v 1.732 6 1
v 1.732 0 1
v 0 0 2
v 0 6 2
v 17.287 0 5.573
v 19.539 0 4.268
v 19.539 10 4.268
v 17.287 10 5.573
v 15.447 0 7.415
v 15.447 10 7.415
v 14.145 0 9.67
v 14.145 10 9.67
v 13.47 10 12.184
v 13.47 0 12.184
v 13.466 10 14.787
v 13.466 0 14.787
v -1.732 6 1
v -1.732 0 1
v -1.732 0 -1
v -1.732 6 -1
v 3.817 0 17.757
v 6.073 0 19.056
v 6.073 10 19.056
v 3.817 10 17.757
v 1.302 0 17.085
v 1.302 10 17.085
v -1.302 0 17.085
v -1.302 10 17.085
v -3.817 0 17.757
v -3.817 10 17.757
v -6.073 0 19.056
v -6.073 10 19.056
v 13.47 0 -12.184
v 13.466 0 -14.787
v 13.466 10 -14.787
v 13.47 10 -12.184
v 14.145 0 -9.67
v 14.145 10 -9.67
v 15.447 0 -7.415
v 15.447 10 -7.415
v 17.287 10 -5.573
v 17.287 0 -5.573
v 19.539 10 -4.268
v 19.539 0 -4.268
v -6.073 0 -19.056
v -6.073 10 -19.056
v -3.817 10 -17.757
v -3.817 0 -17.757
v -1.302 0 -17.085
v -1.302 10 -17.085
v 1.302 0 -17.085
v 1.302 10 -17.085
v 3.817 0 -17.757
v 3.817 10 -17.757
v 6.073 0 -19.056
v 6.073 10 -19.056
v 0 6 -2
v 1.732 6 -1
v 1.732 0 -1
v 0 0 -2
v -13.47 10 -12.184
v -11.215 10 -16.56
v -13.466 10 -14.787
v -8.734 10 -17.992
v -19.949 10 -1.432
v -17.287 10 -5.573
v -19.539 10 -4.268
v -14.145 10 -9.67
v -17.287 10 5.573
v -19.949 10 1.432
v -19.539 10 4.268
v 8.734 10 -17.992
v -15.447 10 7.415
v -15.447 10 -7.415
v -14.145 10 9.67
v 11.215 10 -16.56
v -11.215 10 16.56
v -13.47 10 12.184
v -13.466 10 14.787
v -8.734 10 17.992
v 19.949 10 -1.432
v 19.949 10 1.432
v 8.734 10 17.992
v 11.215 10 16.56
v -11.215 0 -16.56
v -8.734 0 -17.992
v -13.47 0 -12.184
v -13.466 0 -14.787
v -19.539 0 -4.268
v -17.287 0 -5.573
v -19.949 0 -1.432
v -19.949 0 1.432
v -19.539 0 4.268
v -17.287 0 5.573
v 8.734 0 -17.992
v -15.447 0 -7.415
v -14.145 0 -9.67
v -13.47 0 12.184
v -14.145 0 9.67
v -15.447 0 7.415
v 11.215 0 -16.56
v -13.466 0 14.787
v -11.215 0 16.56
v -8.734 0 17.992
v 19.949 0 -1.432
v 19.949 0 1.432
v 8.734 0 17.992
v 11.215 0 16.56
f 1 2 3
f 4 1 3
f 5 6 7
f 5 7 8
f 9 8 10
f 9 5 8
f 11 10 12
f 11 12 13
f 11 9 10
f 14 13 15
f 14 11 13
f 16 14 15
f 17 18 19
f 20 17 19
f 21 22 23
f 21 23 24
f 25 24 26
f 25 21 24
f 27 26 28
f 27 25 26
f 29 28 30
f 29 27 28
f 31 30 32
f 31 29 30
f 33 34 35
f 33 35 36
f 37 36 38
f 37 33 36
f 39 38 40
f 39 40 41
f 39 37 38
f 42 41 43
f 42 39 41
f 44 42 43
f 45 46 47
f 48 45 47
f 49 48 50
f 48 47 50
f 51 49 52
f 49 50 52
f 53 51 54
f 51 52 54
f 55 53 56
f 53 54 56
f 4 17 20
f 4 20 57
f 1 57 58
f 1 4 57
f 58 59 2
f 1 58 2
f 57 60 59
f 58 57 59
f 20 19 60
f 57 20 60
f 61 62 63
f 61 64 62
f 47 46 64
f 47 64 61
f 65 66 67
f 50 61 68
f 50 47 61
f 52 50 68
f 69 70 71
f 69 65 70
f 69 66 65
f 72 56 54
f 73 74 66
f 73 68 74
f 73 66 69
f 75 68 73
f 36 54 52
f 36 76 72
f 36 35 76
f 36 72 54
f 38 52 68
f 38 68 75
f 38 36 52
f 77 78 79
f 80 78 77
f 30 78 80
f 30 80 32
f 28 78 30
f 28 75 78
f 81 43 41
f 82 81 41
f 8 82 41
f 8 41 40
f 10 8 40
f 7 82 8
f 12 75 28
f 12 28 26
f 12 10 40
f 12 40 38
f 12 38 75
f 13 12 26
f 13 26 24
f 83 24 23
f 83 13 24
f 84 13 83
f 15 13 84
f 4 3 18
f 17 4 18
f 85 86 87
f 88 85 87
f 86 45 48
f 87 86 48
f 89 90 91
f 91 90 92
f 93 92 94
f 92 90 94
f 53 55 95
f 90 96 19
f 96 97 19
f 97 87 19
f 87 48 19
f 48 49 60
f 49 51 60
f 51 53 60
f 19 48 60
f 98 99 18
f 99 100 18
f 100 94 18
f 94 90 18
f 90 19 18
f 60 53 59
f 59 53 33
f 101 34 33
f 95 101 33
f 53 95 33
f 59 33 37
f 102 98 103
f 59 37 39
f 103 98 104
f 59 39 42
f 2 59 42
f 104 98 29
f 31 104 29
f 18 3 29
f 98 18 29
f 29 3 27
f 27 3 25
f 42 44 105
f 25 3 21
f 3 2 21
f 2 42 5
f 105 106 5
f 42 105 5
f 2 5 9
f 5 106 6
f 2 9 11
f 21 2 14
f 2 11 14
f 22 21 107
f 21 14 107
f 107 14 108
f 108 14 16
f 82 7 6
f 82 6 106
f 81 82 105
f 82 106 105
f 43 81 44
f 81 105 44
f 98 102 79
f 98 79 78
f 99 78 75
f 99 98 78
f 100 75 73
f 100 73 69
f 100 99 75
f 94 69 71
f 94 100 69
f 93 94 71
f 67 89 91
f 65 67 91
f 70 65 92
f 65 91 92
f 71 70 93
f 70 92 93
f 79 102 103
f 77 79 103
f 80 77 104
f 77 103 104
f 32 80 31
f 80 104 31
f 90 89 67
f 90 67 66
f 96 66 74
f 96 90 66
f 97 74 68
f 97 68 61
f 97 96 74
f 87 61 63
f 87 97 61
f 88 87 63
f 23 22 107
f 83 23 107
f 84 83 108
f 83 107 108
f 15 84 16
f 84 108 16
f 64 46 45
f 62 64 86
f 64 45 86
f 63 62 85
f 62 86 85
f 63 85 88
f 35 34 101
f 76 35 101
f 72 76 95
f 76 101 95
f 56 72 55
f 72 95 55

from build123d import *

# Parameters (mm, degrees)
SCHIZZO1_R                   = 20
ESTRUSIONE_ESTRUSIONE1_DEPTH = 10
SCHIZZO2_R                   = 10
TAGLIO_ESTRUSIONE1_DEPTH     = 10
RIPETIZIONECIRCOLARE1_DEPTH  = 10
TAGLIO_ESTRUSIONE2_DEPTH     = 6


# Read off the part's stored shape, not the designer's step: RipetizioneCircolare1
with BuildPart() as part:
    # Schizzo1 → Estrusione-Estrusione1 (new body)
    with BuildSketch(Plane(origin=(0, 0, 0), x_dir=(1, 0, 0), z_dir=(0, 1, 0))):
        with Locations(Location((0, 0, 0), (0, 0, 270))):
            Circle(SCHIZZO1_R)
    extrude(amount=ESTRUSIONE_ESTRUSIONE1_DEPTH)

    # Schizzo2 → Taglio-Estrusione1 (cut)
    with BuildSketch(Plane(origin=(0, 10, 0), x_dir=(1, 0, 0), z_dir=(0, 1, 0))):
        with Locations((0, 27)):
            Circle(SCHIZZO2_R)
    extrude(amount=-TAGLIO_ESTRUSIONE1_DEPTH, mode=Mode.SUBTRACT)

    # RipetizioneCircolare1 outline → RipetizioneCircolare1 (cut)
    with BuildSketch(Plane(origin=(0, 0, 0), x_dir=(1, 0, 0), z_dir=(0, 1, 0))):
        with BuildLine():
            ThreePointArc((-13.465911046, 14.787469009), (-17.320508076, 10), (-19.539279343, 4.268086546))
            ThreePointArc((-19.539279343, 4.268086546), (-14.722431864, 8.5), (-13.465911046, 14.787469009))
        make_face()
        with BuildLine():
            ThreePointArc((13.465911046, 14.787469009), (14.722431864, 8.5), (19.539279343, 4.268086546))
            ThreePointArc((19.539279343, 4.268086546), (17.320508076, 10), (13.465911046, 14.787469009))
        make_face()
        with BuildLine():
            ThreePointArc((19.539279343, -4.268086546), (14.722431864, -8.5), (13.465911046, -14.787469009))
            ThreePointArc((13.465911046, -14.787469009), (17.320508076, -10), (19.539279343, -4.268086546))
        make_face()
        with BuildLine():
            ThreePointArc((6.073368297, -19.055555556), (0, -17), (-6.073368297, -19.055555556))
            ThreePointArc((-6.073368297, -19.055555556), (0, -20), (6.073368297, -19.055555556))
        make_face()
        with BuildLine():
            ThreePointArc((-13.465911046, -14.787469009), (-14.722431864, -8.5), (-19.539279343, -4.268086546))
            ThreePointArc((-19.539279343, -4.268086546), (-17.320508076, -10), (-13.465911046, -14.787469009))
        make_face()
    extrude(amount=RIPETIZIONECIRCOLARE1_DEPTH, mode=Mode.SUBTRACT)

    # Schizzo3 → Taglio-Estrusione2 (cut)
    with BuildSketch(Plane.XZ):
        Polygon((0, 2), (-1.732050808, 1), (-1.732050808, -1), (0, -2), (1.732050808, -1), (1.732050808, 1), align=None)
    extrude(amount=-TAGLIO_ESTRUSIONE2_DEPTH, mode=Mode.SUBTRACT)


solid = part.part
